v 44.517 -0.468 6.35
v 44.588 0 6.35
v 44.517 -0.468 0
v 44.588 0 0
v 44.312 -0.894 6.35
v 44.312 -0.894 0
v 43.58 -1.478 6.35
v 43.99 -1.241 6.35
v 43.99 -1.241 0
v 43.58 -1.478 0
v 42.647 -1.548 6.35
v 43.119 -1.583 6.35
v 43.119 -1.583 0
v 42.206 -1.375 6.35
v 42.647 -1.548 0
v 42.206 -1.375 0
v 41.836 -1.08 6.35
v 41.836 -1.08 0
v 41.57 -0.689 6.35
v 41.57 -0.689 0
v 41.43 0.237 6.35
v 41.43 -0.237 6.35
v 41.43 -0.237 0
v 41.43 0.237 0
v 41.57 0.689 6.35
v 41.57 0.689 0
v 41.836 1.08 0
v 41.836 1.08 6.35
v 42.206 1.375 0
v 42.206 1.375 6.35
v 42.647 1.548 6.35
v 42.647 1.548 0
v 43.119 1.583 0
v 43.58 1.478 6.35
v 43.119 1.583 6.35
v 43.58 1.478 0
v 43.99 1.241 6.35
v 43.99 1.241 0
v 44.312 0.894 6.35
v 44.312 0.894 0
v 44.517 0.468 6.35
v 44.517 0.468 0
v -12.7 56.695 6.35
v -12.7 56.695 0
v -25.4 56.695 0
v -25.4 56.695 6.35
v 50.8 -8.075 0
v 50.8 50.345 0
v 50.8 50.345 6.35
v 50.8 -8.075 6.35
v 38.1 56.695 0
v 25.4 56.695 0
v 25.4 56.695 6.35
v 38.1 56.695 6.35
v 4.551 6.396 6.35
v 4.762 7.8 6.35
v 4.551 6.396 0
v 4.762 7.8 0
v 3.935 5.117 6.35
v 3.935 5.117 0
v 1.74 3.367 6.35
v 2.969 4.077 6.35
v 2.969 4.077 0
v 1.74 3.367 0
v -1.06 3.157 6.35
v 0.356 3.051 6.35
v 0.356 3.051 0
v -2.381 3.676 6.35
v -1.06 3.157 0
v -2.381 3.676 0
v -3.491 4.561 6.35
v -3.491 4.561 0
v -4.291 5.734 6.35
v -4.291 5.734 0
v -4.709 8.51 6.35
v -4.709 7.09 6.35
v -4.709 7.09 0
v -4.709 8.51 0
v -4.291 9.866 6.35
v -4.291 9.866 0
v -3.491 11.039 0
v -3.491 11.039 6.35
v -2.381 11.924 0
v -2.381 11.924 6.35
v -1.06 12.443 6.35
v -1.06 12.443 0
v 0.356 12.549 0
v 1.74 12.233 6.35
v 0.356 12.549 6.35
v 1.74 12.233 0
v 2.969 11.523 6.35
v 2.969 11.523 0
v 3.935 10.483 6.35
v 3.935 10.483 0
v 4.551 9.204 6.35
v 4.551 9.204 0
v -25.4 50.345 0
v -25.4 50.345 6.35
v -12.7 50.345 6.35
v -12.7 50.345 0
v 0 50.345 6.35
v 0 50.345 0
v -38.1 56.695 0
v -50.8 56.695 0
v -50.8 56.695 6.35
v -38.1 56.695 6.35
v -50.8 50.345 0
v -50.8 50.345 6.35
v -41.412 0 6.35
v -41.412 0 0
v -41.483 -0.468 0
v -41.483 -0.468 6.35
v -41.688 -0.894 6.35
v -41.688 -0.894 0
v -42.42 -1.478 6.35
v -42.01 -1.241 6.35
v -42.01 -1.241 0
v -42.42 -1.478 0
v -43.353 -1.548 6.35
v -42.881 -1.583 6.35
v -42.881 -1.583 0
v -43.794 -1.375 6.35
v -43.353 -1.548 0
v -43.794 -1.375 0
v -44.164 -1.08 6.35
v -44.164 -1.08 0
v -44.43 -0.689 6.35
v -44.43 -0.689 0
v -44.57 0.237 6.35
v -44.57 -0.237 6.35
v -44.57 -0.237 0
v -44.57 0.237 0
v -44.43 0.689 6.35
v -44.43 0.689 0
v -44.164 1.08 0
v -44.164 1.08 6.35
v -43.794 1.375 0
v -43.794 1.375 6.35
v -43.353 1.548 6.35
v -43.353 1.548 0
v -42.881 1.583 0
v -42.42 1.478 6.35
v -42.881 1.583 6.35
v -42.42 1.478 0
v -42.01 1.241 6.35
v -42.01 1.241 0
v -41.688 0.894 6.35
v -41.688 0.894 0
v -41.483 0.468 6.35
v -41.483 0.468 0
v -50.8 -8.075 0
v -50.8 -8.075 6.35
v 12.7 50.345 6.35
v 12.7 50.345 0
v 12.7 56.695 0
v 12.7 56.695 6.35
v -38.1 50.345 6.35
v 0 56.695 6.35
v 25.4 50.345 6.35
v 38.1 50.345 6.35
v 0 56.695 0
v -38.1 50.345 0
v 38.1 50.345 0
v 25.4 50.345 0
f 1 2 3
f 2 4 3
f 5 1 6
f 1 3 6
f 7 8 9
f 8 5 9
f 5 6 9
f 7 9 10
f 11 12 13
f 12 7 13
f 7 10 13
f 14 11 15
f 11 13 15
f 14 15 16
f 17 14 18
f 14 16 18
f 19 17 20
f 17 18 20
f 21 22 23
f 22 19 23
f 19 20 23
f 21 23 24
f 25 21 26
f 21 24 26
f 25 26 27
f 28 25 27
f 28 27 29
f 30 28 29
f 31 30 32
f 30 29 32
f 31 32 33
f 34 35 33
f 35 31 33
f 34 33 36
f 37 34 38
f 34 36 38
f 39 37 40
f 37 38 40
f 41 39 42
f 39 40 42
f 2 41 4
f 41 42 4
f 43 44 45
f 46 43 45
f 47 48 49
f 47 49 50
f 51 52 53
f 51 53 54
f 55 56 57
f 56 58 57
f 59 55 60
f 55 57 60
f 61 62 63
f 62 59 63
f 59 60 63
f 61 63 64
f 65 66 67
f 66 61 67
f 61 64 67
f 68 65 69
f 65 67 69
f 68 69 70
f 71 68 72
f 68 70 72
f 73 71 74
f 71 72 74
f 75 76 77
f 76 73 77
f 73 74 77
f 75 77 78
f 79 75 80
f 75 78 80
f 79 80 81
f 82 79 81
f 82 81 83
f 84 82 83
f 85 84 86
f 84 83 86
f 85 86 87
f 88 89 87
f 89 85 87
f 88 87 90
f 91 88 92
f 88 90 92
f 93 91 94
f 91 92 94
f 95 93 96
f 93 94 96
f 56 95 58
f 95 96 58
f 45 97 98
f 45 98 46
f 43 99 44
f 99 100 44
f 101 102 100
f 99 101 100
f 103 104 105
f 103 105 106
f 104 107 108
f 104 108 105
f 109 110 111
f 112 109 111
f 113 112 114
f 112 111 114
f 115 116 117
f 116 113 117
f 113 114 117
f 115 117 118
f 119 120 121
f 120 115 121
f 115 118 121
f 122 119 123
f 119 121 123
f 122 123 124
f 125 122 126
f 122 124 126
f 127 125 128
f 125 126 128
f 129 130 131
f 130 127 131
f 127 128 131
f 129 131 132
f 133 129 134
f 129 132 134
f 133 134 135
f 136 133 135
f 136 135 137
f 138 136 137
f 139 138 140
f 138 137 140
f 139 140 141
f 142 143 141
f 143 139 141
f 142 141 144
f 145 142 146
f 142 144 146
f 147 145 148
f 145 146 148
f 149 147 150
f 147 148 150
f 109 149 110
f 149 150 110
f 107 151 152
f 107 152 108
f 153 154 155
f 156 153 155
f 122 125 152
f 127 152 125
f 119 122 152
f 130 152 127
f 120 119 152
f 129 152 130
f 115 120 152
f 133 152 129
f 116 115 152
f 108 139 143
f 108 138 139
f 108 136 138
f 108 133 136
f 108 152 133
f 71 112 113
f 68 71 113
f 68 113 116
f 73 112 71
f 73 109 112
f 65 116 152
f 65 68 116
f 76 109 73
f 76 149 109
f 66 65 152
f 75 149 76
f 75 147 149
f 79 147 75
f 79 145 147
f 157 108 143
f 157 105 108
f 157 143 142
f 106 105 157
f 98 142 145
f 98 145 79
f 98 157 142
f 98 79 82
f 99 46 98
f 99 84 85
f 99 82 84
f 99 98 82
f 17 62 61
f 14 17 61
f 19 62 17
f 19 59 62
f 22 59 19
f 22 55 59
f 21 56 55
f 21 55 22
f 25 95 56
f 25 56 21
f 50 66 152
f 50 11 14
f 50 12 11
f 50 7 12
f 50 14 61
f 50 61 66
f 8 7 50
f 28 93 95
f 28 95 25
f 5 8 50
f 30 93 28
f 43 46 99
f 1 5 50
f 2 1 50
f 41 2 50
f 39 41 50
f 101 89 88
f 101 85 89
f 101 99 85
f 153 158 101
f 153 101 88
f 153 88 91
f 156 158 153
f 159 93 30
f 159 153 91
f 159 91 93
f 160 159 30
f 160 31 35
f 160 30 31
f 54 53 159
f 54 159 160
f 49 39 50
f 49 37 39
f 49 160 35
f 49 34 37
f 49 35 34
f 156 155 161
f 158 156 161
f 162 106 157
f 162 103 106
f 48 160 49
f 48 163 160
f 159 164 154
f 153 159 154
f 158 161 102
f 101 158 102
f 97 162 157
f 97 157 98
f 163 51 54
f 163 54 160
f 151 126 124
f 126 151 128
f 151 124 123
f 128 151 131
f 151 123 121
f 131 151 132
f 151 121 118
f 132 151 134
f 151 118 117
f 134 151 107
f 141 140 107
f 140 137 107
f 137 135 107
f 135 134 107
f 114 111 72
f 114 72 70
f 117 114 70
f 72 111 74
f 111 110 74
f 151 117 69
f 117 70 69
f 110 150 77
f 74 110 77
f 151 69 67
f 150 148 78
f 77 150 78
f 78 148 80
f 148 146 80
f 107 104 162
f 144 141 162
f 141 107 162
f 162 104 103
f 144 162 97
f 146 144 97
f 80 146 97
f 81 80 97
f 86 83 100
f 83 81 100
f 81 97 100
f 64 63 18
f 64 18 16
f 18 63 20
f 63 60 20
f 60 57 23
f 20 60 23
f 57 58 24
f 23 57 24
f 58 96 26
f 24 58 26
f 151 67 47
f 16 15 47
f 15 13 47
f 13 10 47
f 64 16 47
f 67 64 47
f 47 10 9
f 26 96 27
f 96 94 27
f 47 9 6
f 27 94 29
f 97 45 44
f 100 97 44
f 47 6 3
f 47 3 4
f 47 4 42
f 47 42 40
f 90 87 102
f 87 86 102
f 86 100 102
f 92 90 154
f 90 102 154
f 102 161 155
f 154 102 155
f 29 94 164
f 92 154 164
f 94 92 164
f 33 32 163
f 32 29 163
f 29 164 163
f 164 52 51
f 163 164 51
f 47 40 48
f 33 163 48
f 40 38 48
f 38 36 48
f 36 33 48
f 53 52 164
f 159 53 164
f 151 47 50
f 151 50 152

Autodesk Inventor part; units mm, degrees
ref_plane "YZ Plane" through (0, 0, 0) normal (1, 0, 0) x (0, 1, 0)
ref_plane "XZ Plane" through (0, 0, 0) normal (0, 1, 0) x (-1, 0, 0)
ref_plane "XY Plane" through (0, 0, 0) normal (0, 0, 1) x (1, 0, 0)
sketch "Sketch1" plane through (0, 0, 0) normal (0, 0, 1) x (1, 0, 0)
  circle A0 centre (0, 7.8) radius 4.7625
  circle A1 centre (-43, 0) radius 1.5875
  circle A2 centre (43, 0) radius 1.5875
  line L0 (-50.8, 56.695) -> (-38.1, 56.695)
  line L1 (50.8, -8.075) -> (-50.8, -8.075)
  line L2 (-50.8, -8.075) -> (-50.8, 56.695)
  line L3 (-50.8, 56.695) -> (-38.1, 56.695)
  line L4 (-38.1, 56.695) -> (-38.1, 50.345)
  line L5 (-50.8, 50.345) -> (-50.8, 56.695)
  line L6 (-38.1, 50.345) -> (-25.4, 50.345)
  line L7 (-25.4, 50.345) -> (-25.4, 56.695)
  line L8 (-38.1, 56.695) -> (-38.1, 50.345)
  line L9 (-12.7, 50.345) -> (-12.7, 56.695)
  line L10 (-12.7, 56.695) -> (-25.4, 56.695)
  line L11 (-25.4, 56.695) -> (-25.4, 50.345)
  line L12 (0, 56.695) -> (0, 50.345)
  line L13 (0, 50.345) -> (-12.7, 50.345)
  line L14 (-12.7, 50.345) -> (-12.7, 56.695)
  line L15 (12.7, 50.345) -> (12.7, 56.695)
  line L16 (12.7, 56.695) -> (0, 56.695)
  line L17 (0, 56.695) -> (0, 50.345)
  line L18 (25.4, 56.695) -> (25.4, 50.345)
  line L19 (25.4, 50.345) -> (12.7, 50.345)
  line L20 (12.7, 50.345) -> (12.7, 56.695)
  line L21 (25.4, 56.695) -> (38.1, 56.695)
  line L22 (38.1, 56.695) -> (38.1, 50.345)
  line L23 (25.4, 50.345) -> (25.4, 56.695)
  line L24 (38.1, 50.345) -> (50.8, 50.345)
  line L25 (38.1, 56.695) -> (38.1, 50.345)
  line L26 (0, 56.695) -> (12.7, 56.695)
  line L27 (25.4, 56.695) -> (38.1, 56.695)
  line L28 (50.8, 50.345) -> (50.8, -8.075)
  point P0 (0, 0)
  dimension "d0" = 9.525
  dimension "d1" = 3.175
  dimension "d2" = 3.175
  dimension "d6" = 0
  dimension "d7" = 101.6
  dimension "d13" = 43
  dimension "d14" = 43
  dimension "d16" = 15.875
  dimension "d17" = 7.8
  dimension "d18" = 7.8
  dimension "d19" = 48.895
  dimension "d21" = 12.7
  dimension "d22" = 6.35
  dimension "d23" = 12.7
  dimension "d24" = 12.7
  dimension "d25" = 6.35
  dimension "d26" = 6.35
  dimension "d27" = 12.7
  dimension "d28" = 6.35
  dimension "d29" = 12.7
  dimension "d30" = 6.35
  dimension "d31" = 12.7
  dimension "d32" = 6.35
extrude "Extrusion1" add sketch "Sketch1" along normal blind 6.35
sketch "Sketch2" plane through (-50.8, 56.695, 0) normal (0, 1, 0) x (1, 0, 0)
  point P0 (50.8, 0)
properties part number "structural" material "Polycarbonate, Clear"
